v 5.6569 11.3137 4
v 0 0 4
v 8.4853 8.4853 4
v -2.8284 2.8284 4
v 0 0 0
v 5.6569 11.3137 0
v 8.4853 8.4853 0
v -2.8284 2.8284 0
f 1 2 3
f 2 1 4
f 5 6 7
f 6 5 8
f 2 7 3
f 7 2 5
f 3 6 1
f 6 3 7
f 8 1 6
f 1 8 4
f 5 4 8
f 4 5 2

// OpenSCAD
// Construct: rotate() with a scalar angle (about Z).
rotate(45) cube([12, 4, 4]);
